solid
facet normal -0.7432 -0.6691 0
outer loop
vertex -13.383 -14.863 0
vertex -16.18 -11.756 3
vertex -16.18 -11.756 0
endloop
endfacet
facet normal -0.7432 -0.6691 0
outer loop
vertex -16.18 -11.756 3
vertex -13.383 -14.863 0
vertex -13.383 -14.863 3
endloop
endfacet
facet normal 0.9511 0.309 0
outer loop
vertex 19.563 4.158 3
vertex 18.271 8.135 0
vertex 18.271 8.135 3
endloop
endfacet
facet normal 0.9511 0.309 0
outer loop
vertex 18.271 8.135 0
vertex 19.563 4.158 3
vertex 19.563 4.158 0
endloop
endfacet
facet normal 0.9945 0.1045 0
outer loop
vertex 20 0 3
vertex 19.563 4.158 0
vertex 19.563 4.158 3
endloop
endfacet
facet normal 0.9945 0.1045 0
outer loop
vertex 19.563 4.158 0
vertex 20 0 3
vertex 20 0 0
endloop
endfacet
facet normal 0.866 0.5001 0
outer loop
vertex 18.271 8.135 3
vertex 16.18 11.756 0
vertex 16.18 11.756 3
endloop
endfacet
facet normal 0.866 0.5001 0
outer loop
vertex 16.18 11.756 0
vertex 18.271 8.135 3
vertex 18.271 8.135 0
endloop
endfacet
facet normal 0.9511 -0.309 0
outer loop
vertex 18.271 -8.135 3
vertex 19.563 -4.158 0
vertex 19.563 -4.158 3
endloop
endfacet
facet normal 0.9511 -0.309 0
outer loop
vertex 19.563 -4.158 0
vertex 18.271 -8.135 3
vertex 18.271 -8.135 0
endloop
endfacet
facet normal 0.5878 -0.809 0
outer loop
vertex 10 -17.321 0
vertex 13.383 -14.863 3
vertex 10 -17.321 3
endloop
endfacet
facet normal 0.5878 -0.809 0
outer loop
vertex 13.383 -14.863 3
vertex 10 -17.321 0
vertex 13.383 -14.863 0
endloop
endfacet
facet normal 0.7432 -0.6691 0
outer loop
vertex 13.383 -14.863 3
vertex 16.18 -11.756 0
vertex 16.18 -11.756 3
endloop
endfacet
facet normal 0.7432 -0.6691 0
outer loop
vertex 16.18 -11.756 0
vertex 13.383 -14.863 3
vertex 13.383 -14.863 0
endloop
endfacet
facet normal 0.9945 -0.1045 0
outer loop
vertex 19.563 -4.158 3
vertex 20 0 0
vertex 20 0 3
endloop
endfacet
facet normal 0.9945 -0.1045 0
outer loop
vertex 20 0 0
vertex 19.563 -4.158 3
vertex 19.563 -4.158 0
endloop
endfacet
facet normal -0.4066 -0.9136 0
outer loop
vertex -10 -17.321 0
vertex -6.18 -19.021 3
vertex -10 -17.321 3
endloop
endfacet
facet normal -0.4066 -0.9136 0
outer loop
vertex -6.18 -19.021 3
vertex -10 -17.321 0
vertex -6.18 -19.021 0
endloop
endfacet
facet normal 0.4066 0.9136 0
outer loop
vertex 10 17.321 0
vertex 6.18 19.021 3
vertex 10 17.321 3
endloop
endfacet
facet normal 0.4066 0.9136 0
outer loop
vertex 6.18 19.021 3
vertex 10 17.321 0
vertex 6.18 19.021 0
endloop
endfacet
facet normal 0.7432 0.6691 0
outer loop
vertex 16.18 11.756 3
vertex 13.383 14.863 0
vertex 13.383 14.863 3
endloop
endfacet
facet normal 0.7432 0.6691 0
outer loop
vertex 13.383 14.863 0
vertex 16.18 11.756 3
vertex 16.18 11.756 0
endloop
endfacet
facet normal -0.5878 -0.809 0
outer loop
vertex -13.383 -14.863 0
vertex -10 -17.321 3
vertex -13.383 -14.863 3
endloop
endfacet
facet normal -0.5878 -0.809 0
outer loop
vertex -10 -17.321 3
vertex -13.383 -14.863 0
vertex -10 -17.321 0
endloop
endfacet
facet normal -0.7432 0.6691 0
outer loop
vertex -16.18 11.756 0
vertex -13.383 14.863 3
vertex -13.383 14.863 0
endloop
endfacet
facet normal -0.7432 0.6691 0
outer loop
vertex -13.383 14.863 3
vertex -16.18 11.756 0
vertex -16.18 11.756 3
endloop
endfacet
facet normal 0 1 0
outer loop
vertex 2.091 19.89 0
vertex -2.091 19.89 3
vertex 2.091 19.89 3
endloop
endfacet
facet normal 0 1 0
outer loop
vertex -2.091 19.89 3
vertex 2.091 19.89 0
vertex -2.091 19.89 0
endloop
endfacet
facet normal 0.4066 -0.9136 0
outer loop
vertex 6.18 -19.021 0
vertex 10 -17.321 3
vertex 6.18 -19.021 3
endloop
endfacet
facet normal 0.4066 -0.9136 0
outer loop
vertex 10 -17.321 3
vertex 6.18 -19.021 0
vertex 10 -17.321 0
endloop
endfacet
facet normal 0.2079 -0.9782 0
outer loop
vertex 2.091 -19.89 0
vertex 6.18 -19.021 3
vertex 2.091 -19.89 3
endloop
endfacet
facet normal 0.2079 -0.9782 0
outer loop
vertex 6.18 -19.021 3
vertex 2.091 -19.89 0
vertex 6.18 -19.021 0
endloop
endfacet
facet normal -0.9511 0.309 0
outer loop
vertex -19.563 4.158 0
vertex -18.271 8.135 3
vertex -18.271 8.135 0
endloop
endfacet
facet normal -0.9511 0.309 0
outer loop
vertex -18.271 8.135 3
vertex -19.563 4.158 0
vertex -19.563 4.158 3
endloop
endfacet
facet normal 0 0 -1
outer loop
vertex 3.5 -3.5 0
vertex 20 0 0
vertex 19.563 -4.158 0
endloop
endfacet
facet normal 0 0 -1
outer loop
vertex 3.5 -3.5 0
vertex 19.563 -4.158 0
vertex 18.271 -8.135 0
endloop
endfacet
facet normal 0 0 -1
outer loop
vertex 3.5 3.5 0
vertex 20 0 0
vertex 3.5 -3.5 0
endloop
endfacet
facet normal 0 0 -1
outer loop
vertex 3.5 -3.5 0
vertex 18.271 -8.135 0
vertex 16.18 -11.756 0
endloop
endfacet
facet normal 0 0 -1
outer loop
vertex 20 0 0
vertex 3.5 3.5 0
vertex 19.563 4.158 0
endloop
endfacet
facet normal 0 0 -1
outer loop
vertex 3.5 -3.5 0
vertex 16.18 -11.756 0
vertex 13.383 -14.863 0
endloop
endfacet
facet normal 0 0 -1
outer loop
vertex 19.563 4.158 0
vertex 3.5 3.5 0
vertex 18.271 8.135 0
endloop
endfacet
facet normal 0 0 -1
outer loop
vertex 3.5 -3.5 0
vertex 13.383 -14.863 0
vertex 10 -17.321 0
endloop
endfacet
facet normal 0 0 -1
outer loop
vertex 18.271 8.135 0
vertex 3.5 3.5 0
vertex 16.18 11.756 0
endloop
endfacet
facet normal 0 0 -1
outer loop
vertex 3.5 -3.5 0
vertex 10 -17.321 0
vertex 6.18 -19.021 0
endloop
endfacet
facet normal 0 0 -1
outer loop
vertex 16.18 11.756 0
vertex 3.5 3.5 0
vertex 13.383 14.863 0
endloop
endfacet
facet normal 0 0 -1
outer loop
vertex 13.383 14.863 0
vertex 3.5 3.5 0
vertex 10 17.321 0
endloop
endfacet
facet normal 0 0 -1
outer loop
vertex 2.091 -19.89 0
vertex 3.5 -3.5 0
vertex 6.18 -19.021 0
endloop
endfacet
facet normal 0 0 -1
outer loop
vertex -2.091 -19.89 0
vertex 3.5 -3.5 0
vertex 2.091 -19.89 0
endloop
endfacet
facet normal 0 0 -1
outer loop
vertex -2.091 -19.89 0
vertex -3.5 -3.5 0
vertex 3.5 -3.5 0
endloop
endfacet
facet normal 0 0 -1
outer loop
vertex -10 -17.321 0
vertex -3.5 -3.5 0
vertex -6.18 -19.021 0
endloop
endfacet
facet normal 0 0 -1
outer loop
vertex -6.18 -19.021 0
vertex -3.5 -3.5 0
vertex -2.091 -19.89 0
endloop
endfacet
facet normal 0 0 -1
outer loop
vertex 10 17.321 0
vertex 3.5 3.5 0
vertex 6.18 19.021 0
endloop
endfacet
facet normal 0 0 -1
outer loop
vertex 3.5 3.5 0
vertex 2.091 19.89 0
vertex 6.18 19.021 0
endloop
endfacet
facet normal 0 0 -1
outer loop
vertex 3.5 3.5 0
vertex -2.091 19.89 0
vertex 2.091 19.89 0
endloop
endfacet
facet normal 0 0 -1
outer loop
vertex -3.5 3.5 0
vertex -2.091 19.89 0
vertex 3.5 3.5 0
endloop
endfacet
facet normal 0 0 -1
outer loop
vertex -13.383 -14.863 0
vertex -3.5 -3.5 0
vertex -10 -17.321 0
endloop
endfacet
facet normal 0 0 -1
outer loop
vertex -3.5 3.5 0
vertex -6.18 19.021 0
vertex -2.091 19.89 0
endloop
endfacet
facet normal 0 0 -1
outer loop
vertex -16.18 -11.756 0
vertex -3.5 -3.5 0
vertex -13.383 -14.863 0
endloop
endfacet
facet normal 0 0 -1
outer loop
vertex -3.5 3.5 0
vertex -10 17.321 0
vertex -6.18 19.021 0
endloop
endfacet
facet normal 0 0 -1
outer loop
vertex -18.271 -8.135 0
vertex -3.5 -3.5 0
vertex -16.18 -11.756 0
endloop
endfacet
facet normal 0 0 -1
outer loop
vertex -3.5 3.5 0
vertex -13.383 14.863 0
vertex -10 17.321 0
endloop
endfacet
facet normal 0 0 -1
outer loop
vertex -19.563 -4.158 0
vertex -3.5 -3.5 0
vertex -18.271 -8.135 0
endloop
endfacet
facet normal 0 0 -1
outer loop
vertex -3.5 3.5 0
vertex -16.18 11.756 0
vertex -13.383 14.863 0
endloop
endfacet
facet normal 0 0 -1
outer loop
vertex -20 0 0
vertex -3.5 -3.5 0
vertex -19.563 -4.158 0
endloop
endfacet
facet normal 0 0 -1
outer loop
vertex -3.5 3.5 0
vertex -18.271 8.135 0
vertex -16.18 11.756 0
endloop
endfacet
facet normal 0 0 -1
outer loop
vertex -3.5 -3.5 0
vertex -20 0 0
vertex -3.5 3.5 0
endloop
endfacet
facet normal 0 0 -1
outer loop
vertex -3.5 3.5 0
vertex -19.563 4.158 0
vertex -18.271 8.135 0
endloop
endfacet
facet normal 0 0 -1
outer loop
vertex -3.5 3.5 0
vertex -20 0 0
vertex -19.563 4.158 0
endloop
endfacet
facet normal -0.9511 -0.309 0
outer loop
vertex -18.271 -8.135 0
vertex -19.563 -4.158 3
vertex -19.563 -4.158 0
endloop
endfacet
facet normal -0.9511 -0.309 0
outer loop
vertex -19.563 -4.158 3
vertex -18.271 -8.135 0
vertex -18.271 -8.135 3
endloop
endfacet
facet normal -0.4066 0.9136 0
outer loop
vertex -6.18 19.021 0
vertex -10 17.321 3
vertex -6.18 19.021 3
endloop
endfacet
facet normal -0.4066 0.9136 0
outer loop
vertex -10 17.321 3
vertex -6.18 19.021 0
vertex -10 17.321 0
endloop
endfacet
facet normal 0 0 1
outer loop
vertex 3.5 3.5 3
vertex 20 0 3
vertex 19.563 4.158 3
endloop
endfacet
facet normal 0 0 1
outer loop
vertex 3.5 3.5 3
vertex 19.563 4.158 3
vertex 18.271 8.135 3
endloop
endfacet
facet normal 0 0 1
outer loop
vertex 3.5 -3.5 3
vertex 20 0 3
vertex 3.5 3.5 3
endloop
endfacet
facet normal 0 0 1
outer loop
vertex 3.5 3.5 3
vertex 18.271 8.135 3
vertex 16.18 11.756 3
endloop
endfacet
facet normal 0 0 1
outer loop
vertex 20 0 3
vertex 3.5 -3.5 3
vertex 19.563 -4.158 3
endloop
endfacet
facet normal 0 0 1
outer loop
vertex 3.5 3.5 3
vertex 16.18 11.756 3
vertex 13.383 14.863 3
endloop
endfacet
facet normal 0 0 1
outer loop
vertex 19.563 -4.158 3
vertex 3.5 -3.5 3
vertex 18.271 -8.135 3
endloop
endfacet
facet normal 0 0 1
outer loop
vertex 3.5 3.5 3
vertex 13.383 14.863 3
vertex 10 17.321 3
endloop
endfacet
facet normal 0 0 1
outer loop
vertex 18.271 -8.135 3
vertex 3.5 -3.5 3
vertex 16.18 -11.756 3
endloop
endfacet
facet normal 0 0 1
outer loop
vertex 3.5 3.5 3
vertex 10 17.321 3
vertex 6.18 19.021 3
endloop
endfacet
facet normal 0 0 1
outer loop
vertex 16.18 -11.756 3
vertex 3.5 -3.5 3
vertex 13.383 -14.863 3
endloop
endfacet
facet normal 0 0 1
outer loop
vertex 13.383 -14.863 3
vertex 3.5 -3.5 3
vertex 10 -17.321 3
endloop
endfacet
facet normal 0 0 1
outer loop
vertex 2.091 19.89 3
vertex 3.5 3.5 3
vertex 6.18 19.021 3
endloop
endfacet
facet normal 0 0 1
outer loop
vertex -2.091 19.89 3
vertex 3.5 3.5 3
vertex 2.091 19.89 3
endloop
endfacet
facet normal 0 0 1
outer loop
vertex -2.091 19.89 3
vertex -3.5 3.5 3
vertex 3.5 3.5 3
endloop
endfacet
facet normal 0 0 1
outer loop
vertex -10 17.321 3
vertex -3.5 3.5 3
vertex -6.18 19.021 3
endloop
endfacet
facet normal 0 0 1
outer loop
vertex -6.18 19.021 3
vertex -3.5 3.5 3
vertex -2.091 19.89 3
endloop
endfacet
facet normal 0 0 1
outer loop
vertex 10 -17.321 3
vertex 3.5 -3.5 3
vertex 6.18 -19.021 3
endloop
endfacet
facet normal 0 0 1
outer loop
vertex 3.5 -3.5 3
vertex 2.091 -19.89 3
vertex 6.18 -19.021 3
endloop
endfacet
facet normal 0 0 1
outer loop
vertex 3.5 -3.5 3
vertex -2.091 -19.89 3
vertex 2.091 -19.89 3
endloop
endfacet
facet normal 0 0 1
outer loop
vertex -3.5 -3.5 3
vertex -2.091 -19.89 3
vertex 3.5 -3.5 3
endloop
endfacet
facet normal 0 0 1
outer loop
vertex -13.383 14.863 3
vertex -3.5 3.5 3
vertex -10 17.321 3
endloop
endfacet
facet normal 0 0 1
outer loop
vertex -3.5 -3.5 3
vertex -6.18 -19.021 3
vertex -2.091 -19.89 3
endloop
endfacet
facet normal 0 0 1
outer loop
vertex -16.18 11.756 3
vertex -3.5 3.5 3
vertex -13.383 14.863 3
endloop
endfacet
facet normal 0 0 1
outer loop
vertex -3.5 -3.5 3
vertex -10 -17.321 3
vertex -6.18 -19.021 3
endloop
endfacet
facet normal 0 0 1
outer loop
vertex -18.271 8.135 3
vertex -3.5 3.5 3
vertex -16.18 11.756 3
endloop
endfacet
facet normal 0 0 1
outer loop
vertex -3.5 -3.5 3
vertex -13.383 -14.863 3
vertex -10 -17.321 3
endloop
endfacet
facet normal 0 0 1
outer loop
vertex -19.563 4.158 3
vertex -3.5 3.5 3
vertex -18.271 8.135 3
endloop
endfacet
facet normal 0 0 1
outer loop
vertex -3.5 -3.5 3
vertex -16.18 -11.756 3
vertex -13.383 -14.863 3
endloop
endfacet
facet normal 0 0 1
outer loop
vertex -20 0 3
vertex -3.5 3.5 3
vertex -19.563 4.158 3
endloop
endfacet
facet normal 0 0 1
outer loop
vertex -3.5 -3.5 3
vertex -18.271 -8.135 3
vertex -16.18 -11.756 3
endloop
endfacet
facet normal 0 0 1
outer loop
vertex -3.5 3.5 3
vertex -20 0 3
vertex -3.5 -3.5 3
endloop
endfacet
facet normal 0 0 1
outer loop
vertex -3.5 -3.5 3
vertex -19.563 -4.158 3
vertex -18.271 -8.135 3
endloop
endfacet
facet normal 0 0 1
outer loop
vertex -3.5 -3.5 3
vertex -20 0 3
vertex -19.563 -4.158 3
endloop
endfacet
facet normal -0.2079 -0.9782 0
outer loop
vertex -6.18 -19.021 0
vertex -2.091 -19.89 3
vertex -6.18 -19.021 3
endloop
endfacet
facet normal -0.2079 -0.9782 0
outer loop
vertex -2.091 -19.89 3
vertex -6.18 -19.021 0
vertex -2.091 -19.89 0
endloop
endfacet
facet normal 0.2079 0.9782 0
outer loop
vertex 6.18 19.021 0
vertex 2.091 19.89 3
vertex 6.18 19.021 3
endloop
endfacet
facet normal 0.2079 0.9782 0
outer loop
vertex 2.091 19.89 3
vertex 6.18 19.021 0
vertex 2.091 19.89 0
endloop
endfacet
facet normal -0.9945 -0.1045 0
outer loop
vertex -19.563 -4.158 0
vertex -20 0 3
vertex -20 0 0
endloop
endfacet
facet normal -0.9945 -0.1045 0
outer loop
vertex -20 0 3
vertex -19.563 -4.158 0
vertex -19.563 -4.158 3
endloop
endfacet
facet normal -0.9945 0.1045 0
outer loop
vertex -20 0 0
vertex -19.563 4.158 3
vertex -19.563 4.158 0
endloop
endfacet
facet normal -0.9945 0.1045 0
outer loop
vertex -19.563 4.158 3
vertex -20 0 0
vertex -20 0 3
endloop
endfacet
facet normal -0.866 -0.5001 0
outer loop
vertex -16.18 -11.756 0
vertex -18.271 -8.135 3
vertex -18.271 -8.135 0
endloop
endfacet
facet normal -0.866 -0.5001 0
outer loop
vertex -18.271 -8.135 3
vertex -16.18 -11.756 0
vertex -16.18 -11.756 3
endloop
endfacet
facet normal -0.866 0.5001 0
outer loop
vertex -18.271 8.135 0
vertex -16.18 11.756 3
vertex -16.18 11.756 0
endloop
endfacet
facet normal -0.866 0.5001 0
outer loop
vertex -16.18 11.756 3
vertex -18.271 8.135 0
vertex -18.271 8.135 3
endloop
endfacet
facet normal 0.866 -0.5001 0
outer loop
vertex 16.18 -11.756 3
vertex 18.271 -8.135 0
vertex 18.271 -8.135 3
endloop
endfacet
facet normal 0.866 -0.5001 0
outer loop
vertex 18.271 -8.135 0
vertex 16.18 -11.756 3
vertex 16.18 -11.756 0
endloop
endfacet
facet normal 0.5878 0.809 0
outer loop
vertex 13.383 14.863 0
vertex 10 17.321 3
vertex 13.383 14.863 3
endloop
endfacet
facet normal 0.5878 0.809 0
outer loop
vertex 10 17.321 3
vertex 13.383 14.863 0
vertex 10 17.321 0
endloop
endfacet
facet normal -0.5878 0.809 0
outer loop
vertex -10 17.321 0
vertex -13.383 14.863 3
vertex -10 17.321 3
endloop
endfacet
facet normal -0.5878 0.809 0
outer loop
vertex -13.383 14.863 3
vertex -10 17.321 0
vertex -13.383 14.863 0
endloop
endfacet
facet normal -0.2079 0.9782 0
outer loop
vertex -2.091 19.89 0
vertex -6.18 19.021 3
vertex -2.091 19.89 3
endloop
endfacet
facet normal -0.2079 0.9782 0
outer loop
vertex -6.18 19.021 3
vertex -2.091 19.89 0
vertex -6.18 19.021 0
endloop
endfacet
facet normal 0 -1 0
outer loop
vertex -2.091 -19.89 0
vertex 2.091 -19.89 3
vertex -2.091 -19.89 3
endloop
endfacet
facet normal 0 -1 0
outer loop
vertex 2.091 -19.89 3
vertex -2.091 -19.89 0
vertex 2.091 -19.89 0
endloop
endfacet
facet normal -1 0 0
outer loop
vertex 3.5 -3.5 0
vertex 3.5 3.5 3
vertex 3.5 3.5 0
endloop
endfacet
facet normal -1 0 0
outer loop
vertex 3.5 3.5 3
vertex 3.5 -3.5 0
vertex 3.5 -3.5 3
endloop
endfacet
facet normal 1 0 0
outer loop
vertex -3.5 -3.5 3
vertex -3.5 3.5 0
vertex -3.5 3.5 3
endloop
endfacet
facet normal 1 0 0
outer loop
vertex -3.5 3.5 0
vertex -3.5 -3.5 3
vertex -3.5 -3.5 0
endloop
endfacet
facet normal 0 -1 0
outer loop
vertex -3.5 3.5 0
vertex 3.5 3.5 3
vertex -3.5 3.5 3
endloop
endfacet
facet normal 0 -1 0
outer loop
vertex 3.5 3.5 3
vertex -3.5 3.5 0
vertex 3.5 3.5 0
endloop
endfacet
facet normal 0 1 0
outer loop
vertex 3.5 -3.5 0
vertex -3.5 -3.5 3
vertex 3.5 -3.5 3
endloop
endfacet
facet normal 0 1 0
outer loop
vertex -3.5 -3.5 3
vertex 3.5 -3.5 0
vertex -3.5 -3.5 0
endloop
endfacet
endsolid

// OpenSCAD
difference()
{
    cylinder(h = 3,
             r = 20);

    translate([0,0,-0.1])
    cube (center=true, 
          size = [7, 7, 7]);
}
